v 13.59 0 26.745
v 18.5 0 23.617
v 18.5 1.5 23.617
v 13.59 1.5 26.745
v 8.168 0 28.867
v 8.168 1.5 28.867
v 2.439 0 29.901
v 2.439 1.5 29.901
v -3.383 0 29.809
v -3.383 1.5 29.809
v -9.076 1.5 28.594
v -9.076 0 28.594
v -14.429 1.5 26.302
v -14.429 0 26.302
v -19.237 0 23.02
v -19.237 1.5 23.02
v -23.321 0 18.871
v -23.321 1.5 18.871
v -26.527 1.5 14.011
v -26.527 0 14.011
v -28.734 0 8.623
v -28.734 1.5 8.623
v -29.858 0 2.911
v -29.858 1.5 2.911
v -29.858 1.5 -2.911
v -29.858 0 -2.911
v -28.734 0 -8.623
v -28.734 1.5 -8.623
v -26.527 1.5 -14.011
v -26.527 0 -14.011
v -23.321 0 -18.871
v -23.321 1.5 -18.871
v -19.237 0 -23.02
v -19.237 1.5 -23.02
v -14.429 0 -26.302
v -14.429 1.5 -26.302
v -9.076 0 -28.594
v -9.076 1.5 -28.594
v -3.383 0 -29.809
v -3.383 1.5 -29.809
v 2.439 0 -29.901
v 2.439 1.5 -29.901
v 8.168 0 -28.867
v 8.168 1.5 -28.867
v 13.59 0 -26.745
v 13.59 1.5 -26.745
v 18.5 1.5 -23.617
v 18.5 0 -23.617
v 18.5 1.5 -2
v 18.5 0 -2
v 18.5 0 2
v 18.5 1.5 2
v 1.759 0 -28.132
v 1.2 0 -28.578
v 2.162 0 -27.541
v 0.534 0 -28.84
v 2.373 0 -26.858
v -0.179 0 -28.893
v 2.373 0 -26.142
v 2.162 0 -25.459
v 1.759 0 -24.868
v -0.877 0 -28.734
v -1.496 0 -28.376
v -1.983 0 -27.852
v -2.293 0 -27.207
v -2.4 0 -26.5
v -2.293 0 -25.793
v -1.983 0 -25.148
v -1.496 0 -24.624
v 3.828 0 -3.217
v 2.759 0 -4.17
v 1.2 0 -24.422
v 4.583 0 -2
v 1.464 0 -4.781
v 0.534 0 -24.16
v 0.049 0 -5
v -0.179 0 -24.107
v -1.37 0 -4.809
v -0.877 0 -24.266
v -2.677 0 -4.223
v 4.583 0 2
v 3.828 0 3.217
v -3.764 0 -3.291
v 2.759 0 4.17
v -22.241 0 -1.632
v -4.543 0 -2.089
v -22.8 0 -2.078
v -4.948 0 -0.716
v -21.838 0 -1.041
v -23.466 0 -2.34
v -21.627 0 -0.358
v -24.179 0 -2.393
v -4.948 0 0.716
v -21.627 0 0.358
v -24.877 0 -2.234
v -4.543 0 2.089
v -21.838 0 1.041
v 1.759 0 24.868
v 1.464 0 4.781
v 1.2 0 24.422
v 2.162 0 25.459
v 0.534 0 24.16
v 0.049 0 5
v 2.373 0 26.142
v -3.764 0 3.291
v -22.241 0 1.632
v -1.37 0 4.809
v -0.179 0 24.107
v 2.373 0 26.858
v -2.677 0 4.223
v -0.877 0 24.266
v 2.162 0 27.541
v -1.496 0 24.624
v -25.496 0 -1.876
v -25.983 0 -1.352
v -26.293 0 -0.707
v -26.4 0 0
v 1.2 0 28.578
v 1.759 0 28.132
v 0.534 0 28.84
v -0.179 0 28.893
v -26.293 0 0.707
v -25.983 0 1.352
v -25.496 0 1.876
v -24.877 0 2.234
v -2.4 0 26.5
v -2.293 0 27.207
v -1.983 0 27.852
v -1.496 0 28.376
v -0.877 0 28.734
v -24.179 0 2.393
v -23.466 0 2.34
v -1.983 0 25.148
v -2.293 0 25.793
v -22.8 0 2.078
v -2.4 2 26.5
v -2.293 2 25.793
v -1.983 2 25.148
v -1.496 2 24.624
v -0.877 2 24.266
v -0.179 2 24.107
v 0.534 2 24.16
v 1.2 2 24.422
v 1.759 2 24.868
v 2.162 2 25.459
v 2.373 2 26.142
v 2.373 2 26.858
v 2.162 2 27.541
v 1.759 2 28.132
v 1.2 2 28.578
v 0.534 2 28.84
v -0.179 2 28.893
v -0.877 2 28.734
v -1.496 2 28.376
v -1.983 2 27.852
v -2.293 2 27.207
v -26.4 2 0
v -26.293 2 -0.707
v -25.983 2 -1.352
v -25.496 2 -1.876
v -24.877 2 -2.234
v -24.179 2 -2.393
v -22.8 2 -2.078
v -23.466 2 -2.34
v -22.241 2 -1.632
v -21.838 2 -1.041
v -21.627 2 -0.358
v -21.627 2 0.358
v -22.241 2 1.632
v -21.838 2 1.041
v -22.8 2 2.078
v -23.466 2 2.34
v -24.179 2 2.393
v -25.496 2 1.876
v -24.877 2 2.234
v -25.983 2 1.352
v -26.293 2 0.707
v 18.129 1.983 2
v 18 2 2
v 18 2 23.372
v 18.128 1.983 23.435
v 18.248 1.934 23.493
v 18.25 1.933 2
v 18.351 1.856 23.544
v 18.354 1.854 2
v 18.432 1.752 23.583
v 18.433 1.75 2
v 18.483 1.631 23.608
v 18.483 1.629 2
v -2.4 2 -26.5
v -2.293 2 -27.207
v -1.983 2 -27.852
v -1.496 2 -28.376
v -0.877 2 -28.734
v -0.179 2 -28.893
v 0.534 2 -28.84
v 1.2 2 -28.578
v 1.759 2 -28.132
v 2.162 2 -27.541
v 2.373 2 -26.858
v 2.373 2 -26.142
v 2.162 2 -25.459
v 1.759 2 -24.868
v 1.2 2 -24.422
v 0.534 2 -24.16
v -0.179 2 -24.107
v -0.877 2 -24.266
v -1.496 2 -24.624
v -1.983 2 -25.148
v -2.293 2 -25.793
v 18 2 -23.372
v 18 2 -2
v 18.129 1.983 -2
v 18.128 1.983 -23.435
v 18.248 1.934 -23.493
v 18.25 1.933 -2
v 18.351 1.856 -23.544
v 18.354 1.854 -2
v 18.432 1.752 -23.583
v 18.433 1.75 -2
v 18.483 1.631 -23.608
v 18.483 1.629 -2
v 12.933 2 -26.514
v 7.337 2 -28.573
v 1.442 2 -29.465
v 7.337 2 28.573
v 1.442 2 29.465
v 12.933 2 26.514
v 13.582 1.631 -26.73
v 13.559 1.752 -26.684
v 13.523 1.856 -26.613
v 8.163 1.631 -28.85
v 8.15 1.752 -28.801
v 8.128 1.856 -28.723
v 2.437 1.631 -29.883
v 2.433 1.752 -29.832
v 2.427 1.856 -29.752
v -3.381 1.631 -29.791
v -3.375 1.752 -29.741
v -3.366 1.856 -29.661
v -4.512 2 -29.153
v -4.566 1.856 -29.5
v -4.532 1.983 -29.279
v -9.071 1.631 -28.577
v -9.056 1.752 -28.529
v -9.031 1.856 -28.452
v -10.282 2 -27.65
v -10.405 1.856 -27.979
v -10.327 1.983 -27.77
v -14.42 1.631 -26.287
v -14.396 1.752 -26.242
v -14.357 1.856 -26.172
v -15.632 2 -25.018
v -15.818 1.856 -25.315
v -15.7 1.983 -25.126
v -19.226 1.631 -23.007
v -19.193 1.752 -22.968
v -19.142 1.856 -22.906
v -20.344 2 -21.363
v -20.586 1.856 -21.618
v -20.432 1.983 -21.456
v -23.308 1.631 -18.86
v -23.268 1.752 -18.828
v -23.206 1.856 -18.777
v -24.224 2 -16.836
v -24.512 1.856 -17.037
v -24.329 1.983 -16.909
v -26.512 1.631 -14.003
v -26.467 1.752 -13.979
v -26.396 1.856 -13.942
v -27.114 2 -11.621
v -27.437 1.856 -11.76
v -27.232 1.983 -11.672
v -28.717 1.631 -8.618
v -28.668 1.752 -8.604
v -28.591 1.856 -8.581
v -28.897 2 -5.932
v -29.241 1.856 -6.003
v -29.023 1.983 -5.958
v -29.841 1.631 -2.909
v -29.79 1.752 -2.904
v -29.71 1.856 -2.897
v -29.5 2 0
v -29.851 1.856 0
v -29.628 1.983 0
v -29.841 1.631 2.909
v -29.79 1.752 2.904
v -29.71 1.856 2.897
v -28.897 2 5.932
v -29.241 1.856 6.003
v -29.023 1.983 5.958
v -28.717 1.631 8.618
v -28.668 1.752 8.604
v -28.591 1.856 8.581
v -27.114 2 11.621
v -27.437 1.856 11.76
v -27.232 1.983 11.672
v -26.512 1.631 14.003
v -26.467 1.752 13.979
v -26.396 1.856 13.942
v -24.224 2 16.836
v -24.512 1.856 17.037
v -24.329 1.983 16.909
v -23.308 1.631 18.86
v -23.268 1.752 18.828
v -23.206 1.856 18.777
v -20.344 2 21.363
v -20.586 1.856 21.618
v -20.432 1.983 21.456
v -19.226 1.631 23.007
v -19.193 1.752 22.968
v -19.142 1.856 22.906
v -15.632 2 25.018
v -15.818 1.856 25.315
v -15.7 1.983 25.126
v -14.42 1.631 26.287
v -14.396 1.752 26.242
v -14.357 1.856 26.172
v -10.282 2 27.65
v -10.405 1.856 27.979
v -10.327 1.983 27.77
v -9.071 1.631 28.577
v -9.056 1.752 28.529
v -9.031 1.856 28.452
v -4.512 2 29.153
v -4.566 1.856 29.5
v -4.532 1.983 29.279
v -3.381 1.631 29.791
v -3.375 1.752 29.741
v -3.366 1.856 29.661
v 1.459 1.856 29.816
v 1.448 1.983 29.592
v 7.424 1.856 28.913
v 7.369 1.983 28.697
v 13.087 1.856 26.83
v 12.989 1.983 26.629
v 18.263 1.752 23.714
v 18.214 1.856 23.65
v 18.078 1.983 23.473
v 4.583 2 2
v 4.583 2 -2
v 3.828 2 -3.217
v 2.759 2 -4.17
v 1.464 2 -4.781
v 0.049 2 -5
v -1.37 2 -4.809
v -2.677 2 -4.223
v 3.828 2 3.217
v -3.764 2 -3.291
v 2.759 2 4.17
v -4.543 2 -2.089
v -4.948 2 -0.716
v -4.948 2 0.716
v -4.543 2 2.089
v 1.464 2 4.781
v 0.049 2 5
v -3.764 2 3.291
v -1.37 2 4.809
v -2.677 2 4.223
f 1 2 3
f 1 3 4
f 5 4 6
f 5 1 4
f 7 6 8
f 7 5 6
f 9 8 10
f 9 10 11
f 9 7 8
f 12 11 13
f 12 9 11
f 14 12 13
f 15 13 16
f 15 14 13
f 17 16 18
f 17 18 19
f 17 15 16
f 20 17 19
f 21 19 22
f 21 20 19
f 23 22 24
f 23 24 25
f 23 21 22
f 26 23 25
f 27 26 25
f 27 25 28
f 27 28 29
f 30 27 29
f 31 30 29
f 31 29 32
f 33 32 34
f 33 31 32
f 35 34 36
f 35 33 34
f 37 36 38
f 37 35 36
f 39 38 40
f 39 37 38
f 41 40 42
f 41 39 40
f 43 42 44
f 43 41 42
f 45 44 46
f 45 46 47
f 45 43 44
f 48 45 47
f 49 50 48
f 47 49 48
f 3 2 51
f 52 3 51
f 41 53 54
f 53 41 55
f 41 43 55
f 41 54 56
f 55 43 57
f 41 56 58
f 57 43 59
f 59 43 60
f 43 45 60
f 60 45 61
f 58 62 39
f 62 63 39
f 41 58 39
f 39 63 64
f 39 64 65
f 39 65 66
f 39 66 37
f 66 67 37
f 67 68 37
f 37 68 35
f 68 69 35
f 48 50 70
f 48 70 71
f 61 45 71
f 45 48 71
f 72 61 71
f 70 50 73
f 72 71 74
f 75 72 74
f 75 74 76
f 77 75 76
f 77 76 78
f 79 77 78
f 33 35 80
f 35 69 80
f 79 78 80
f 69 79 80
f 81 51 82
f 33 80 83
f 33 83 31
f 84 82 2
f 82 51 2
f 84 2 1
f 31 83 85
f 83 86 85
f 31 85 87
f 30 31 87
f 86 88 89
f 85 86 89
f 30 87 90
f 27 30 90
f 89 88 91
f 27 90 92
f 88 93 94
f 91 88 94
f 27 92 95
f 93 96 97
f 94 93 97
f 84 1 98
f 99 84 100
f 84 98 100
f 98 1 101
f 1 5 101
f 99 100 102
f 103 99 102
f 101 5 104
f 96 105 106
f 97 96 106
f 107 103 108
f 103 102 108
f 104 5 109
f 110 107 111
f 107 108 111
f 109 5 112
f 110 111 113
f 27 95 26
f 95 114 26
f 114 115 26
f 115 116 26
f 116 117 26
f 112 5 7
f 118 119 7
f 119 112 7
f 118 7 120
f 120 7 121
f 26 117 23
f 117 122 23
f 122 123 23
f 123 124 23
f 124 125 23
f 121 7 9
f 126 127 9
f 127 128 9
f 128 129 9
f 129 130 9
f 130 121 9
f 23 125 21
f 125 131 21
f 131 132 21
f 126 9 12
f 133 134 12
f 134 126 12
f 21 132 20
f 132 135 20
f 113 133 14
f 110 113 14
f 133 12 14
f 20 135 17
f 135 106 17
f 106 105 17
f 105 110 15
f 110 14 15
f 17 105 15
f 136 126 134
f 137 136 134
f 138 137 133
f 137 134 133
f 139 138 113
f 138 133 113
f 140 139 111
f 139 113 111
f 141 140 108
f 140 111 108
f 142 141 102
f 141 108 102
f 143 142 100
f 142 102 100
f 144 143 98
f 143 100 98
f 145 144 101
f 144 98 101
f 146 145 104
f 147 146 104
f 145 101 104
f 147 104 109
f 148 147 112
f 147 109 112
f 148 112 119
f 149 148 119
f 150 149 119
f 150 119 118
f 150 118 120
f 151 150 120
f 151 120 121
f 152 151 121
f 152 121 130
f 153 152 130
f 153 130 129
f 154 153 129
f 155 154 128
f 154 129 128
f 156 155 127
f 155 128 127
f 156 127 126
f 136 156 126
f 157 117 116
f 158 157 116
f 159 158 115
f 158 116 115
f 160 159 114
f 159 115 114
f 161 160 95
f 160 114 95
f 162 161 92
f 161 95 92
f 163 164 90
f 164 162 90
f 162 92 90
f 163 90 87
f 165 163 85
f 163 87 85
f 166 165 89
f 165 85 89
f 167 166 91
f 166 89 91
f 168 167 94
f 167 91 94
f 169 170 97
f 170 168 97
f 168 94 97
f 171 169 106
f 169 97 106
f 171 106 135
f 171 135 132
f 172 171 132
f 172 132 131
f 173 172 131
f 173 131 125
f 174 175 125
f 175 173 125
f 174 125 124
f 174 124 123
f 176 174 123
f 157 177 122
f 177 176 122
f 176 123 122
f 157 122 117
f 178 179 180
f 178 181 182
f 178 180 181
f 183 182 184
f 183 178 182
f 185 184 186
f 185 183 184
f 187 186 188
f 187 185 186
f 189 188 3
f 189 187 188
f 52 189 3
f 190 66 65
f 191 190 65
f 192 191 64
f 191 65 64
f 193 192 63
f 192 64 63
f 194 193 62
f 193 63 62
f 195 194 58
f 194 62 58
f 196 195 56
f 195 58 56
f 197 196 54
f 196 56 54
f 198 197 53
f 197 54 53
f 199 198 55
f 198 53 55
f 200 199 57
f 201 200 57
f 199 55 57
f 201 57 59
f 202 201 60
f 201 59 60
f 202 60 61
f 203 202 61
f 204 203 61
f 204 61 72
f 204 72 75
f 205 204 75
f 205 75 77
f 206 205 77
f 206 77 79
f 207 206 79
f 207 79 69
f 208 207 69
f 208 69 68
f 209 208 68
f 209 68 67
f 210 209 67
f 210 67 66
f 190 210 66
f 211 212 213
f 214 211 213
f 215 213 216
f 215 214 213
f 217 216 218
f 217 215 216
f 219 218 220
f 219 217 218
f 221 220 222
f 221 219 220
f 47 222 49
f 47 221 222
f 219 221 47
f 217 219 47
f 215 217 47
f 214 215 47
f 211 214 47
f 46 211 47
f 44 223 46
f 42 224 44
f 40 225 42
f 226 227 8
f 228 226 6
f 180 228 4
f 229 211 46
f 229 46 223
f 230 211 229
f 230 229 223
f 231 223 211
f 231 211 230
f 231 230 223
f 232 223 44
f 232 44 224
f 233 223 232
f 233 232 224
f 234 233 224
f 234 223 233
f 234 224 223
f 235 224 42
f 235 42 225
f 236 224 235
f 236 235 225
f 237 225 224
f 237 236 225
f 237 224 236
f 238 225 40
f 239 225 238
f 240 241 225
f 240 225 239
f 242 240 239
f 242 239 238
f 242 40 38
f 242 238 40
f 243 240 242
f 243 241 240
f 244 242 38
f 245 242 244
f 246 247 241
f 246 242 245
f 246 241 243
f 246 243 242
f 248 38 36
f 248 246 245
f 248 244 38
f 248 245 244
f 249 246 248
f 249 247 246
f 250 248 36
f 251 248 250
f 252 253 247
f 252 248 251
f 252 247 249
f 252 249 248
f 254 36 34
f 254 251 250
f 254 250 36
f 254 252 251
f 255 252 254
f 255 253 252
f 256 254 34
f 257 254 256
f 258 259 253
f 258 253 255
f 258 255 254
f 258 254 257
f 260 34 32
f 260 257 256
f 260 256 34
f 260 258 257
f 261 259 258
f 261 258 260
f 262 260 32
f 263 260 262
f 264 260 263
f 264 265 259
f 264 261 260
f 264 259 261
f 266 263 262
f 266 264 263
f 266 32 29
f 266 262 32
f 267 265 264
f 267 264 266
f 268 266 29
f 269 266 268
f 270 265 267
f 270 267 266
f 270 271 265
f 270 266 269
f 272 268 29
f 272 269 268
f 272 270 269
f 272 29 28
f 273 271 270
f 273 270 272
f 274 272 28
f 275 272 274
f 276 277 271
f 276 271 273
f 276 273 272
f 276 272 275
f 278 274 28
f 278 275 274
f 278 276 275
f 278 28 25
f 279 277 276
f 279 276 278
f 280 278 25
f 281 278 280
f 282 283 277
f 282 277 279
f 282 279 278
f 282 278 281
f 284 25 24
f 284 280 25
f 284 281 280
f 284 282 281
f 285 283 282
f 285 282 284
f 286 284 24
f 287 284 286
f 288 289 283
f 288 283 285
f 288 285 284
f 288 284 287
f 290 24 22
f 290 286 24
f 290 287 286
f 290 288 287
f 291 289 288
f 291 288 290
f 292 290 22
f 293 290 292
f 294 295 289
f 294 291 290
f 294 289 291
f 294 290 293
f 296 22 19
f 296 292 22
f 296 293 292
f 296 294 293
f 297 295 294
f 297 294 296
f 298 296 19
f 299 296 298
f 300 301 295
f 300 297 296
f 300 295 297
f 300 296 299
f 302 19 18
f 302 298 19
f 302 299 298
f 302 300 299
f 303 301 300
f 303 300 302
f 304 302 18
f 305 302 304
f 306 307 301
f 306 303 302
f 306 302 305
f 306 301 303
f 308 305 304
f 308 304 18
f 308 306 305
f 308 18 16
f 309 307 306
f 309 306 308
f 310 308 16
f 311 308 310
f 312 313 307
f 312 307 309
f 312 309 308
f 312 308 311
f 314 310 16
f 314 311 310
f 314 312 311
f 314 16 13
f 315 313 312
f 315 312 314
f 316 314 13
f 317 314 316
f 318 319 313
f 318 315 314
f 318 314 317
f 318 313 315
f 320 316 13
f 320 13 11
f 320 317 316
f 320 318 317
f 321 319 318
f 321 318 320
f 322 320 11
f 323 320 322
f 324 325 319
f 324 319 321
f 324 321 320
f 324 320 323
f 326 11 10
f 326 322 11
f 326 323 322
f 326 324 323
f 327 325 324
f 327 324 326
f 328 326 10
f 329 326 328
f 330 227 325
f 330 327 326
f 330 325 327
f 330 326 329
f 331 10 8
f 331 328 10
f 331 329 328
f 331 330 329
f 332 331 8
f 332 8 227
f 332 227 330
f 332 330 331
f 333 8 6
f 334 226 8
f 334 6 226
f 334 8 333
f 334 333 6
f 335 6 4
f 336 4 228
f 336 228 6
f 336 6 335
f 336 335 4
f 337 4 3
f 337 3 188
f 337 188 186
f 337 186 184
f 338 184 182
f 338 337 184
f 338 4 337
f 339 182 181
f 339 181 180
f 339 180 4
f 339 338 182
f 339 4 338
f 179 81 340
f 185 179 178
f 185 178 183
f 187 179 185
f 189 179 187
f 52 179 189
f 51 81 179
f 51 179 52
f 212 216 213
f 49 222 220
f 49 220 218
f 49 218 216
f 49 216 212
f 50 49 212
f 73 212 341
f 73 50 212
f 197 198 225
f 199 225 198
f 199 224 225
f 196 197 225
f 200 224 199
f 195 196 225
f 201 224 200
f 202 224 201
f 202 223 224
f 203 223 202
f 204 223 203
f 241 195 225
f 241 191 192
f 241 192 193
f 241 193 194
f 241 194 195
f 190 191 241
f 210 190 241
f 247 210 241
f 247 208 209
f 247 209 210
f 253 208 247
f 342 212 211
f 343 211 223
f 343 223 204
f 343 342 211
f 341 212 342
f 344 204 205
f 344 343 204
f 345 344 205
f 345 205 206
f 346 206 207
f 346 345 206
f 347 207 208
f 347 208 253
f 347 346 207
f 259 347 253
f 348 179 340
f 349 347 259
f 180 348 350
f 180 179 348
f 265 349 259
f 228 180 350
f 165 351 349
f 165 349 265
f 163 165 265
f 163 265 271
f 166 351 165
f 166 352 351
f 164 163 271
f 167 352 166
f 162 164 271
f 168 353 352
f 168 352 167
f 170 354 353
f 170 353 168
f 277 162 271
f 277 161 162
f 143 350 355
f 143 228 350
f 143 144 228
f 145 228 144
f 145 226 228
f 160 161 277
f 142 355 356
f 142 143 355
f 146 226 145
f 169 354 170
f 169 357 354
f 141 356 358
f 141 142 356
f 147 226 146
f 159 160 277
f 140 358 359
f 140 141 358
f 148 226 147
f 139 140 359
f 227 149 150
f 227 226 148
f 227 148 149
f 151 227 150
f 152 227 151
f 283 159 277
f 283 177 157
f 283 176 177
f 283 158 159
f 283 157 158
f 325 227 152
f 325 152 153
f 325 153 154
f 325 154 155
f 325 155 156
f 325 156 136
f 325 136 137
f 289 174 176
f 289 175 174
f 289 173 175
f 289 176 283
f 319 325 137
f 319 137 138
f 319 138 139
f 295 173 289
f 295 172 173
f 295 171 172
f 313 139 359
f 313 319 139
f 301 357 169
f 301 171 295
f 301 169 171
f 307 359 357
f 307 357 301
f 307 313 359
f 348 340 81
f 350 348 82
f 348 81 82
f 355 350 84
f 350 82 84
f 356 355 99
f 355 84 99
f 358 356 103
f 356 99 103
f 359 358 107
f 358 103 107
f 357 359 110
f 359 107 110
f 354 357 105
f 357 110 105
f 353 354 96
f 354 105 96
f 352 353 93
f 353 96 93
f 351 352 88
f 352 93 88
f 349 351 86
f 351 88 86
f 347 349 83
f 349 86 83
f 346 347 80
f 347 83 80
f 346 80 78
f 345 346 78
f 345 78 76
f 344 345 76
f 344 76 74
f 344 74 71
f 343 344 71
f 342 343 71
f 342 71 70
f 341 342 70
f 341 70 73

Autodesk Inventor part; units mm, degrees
ref_plane "YZ Plane" through (0, 0, 0) normal (1, 0, 0) x (0, 1, 0)
ref_plane "XZ Plane" through (0, 0, 0) normal (0, 1, 0) x (-1, 0, 0)
ref_plane "XY Plane" through (0, 0, 0) normal (0, 0, 1) x (1, 0, 0)
sketch "Sketch1" plane through (0, 0, 0) normal (0, 1, 0) x (-1, 0, 0)
  arc A0 (-18.5, -23.6167) -> (-18.5, 23.6167) centre (0, 0) ccw
  line L0 (30, 0) -> (24, 0)
  circle A1 centre (24, 0) radius 2.4
  line L1 (0, 30) -> (0, 26.5)
  line L2 (0, -30) -> (0, -26.5)
  circle A2 centre (0, 26.5) radius 2.4
  circle A3 centre (0, -26.5) radius 2.4
  circle A4 centre (0, 0) radius 5
  line L3 (-30, 0) -> (-18.5, 0)
  line L4 (-18.5, 23.6167) -> (-18.5, -23.6167)
  dimension "d0" = 60
  dimension "d1" = 6
  dimension "d2" = 4.8
  dimension "d3" = 3.5
  dimension "d4" = 3.5
  dimension "d5" = 4.8
  dimension "d6" = 4.8
  dimension "d7" = 10
  dimension "d8" = 11.5
extrude "Extrusion1" add sketch "Sketch1" along normal blind 2
sketch "Sketch2" plane through (0, 2, 0) normal (0, 1, 0) x (1, 0, 0)
  point P0 (0, 0)
sketch "Sketch3" plane through (0, 2, 0) normal (0, 1, 0) x (1, 0, 0)
  point P0 (0, 0)
sketch "Sketch4" plane through (0, 0, 0) normal (0, -1, 0) x (1, 0, 0)
  line L0 (21.8231, -2) -> (3.4171, -2)
  line L1 (3.4171, -2) -> (3.4171, 2)
  line L2 (3.4171, 2) -> (21.8231, 2)
  line L3 (21.8231, 2) -> (21.8231, -2)
  line L4 (21.8231, -2) -> (3.4171, 2) construction
  line L5 (3.4171, -2) -> (21.8231, 2) construction
  point P0 (0, 0)
  point P1 (12.6201, 0)
  dimension "d17" = 4
extrude "Extrusion2" cut sketch "Sketch4" against normal blind 3
fillet "Fillet1" radius 0.5 3 edges at (-30, 2, 0) (18.5, 2, -12.8084) (18.5, 2, 12.8084)
properties part number "webcam_holder_center_part2"
